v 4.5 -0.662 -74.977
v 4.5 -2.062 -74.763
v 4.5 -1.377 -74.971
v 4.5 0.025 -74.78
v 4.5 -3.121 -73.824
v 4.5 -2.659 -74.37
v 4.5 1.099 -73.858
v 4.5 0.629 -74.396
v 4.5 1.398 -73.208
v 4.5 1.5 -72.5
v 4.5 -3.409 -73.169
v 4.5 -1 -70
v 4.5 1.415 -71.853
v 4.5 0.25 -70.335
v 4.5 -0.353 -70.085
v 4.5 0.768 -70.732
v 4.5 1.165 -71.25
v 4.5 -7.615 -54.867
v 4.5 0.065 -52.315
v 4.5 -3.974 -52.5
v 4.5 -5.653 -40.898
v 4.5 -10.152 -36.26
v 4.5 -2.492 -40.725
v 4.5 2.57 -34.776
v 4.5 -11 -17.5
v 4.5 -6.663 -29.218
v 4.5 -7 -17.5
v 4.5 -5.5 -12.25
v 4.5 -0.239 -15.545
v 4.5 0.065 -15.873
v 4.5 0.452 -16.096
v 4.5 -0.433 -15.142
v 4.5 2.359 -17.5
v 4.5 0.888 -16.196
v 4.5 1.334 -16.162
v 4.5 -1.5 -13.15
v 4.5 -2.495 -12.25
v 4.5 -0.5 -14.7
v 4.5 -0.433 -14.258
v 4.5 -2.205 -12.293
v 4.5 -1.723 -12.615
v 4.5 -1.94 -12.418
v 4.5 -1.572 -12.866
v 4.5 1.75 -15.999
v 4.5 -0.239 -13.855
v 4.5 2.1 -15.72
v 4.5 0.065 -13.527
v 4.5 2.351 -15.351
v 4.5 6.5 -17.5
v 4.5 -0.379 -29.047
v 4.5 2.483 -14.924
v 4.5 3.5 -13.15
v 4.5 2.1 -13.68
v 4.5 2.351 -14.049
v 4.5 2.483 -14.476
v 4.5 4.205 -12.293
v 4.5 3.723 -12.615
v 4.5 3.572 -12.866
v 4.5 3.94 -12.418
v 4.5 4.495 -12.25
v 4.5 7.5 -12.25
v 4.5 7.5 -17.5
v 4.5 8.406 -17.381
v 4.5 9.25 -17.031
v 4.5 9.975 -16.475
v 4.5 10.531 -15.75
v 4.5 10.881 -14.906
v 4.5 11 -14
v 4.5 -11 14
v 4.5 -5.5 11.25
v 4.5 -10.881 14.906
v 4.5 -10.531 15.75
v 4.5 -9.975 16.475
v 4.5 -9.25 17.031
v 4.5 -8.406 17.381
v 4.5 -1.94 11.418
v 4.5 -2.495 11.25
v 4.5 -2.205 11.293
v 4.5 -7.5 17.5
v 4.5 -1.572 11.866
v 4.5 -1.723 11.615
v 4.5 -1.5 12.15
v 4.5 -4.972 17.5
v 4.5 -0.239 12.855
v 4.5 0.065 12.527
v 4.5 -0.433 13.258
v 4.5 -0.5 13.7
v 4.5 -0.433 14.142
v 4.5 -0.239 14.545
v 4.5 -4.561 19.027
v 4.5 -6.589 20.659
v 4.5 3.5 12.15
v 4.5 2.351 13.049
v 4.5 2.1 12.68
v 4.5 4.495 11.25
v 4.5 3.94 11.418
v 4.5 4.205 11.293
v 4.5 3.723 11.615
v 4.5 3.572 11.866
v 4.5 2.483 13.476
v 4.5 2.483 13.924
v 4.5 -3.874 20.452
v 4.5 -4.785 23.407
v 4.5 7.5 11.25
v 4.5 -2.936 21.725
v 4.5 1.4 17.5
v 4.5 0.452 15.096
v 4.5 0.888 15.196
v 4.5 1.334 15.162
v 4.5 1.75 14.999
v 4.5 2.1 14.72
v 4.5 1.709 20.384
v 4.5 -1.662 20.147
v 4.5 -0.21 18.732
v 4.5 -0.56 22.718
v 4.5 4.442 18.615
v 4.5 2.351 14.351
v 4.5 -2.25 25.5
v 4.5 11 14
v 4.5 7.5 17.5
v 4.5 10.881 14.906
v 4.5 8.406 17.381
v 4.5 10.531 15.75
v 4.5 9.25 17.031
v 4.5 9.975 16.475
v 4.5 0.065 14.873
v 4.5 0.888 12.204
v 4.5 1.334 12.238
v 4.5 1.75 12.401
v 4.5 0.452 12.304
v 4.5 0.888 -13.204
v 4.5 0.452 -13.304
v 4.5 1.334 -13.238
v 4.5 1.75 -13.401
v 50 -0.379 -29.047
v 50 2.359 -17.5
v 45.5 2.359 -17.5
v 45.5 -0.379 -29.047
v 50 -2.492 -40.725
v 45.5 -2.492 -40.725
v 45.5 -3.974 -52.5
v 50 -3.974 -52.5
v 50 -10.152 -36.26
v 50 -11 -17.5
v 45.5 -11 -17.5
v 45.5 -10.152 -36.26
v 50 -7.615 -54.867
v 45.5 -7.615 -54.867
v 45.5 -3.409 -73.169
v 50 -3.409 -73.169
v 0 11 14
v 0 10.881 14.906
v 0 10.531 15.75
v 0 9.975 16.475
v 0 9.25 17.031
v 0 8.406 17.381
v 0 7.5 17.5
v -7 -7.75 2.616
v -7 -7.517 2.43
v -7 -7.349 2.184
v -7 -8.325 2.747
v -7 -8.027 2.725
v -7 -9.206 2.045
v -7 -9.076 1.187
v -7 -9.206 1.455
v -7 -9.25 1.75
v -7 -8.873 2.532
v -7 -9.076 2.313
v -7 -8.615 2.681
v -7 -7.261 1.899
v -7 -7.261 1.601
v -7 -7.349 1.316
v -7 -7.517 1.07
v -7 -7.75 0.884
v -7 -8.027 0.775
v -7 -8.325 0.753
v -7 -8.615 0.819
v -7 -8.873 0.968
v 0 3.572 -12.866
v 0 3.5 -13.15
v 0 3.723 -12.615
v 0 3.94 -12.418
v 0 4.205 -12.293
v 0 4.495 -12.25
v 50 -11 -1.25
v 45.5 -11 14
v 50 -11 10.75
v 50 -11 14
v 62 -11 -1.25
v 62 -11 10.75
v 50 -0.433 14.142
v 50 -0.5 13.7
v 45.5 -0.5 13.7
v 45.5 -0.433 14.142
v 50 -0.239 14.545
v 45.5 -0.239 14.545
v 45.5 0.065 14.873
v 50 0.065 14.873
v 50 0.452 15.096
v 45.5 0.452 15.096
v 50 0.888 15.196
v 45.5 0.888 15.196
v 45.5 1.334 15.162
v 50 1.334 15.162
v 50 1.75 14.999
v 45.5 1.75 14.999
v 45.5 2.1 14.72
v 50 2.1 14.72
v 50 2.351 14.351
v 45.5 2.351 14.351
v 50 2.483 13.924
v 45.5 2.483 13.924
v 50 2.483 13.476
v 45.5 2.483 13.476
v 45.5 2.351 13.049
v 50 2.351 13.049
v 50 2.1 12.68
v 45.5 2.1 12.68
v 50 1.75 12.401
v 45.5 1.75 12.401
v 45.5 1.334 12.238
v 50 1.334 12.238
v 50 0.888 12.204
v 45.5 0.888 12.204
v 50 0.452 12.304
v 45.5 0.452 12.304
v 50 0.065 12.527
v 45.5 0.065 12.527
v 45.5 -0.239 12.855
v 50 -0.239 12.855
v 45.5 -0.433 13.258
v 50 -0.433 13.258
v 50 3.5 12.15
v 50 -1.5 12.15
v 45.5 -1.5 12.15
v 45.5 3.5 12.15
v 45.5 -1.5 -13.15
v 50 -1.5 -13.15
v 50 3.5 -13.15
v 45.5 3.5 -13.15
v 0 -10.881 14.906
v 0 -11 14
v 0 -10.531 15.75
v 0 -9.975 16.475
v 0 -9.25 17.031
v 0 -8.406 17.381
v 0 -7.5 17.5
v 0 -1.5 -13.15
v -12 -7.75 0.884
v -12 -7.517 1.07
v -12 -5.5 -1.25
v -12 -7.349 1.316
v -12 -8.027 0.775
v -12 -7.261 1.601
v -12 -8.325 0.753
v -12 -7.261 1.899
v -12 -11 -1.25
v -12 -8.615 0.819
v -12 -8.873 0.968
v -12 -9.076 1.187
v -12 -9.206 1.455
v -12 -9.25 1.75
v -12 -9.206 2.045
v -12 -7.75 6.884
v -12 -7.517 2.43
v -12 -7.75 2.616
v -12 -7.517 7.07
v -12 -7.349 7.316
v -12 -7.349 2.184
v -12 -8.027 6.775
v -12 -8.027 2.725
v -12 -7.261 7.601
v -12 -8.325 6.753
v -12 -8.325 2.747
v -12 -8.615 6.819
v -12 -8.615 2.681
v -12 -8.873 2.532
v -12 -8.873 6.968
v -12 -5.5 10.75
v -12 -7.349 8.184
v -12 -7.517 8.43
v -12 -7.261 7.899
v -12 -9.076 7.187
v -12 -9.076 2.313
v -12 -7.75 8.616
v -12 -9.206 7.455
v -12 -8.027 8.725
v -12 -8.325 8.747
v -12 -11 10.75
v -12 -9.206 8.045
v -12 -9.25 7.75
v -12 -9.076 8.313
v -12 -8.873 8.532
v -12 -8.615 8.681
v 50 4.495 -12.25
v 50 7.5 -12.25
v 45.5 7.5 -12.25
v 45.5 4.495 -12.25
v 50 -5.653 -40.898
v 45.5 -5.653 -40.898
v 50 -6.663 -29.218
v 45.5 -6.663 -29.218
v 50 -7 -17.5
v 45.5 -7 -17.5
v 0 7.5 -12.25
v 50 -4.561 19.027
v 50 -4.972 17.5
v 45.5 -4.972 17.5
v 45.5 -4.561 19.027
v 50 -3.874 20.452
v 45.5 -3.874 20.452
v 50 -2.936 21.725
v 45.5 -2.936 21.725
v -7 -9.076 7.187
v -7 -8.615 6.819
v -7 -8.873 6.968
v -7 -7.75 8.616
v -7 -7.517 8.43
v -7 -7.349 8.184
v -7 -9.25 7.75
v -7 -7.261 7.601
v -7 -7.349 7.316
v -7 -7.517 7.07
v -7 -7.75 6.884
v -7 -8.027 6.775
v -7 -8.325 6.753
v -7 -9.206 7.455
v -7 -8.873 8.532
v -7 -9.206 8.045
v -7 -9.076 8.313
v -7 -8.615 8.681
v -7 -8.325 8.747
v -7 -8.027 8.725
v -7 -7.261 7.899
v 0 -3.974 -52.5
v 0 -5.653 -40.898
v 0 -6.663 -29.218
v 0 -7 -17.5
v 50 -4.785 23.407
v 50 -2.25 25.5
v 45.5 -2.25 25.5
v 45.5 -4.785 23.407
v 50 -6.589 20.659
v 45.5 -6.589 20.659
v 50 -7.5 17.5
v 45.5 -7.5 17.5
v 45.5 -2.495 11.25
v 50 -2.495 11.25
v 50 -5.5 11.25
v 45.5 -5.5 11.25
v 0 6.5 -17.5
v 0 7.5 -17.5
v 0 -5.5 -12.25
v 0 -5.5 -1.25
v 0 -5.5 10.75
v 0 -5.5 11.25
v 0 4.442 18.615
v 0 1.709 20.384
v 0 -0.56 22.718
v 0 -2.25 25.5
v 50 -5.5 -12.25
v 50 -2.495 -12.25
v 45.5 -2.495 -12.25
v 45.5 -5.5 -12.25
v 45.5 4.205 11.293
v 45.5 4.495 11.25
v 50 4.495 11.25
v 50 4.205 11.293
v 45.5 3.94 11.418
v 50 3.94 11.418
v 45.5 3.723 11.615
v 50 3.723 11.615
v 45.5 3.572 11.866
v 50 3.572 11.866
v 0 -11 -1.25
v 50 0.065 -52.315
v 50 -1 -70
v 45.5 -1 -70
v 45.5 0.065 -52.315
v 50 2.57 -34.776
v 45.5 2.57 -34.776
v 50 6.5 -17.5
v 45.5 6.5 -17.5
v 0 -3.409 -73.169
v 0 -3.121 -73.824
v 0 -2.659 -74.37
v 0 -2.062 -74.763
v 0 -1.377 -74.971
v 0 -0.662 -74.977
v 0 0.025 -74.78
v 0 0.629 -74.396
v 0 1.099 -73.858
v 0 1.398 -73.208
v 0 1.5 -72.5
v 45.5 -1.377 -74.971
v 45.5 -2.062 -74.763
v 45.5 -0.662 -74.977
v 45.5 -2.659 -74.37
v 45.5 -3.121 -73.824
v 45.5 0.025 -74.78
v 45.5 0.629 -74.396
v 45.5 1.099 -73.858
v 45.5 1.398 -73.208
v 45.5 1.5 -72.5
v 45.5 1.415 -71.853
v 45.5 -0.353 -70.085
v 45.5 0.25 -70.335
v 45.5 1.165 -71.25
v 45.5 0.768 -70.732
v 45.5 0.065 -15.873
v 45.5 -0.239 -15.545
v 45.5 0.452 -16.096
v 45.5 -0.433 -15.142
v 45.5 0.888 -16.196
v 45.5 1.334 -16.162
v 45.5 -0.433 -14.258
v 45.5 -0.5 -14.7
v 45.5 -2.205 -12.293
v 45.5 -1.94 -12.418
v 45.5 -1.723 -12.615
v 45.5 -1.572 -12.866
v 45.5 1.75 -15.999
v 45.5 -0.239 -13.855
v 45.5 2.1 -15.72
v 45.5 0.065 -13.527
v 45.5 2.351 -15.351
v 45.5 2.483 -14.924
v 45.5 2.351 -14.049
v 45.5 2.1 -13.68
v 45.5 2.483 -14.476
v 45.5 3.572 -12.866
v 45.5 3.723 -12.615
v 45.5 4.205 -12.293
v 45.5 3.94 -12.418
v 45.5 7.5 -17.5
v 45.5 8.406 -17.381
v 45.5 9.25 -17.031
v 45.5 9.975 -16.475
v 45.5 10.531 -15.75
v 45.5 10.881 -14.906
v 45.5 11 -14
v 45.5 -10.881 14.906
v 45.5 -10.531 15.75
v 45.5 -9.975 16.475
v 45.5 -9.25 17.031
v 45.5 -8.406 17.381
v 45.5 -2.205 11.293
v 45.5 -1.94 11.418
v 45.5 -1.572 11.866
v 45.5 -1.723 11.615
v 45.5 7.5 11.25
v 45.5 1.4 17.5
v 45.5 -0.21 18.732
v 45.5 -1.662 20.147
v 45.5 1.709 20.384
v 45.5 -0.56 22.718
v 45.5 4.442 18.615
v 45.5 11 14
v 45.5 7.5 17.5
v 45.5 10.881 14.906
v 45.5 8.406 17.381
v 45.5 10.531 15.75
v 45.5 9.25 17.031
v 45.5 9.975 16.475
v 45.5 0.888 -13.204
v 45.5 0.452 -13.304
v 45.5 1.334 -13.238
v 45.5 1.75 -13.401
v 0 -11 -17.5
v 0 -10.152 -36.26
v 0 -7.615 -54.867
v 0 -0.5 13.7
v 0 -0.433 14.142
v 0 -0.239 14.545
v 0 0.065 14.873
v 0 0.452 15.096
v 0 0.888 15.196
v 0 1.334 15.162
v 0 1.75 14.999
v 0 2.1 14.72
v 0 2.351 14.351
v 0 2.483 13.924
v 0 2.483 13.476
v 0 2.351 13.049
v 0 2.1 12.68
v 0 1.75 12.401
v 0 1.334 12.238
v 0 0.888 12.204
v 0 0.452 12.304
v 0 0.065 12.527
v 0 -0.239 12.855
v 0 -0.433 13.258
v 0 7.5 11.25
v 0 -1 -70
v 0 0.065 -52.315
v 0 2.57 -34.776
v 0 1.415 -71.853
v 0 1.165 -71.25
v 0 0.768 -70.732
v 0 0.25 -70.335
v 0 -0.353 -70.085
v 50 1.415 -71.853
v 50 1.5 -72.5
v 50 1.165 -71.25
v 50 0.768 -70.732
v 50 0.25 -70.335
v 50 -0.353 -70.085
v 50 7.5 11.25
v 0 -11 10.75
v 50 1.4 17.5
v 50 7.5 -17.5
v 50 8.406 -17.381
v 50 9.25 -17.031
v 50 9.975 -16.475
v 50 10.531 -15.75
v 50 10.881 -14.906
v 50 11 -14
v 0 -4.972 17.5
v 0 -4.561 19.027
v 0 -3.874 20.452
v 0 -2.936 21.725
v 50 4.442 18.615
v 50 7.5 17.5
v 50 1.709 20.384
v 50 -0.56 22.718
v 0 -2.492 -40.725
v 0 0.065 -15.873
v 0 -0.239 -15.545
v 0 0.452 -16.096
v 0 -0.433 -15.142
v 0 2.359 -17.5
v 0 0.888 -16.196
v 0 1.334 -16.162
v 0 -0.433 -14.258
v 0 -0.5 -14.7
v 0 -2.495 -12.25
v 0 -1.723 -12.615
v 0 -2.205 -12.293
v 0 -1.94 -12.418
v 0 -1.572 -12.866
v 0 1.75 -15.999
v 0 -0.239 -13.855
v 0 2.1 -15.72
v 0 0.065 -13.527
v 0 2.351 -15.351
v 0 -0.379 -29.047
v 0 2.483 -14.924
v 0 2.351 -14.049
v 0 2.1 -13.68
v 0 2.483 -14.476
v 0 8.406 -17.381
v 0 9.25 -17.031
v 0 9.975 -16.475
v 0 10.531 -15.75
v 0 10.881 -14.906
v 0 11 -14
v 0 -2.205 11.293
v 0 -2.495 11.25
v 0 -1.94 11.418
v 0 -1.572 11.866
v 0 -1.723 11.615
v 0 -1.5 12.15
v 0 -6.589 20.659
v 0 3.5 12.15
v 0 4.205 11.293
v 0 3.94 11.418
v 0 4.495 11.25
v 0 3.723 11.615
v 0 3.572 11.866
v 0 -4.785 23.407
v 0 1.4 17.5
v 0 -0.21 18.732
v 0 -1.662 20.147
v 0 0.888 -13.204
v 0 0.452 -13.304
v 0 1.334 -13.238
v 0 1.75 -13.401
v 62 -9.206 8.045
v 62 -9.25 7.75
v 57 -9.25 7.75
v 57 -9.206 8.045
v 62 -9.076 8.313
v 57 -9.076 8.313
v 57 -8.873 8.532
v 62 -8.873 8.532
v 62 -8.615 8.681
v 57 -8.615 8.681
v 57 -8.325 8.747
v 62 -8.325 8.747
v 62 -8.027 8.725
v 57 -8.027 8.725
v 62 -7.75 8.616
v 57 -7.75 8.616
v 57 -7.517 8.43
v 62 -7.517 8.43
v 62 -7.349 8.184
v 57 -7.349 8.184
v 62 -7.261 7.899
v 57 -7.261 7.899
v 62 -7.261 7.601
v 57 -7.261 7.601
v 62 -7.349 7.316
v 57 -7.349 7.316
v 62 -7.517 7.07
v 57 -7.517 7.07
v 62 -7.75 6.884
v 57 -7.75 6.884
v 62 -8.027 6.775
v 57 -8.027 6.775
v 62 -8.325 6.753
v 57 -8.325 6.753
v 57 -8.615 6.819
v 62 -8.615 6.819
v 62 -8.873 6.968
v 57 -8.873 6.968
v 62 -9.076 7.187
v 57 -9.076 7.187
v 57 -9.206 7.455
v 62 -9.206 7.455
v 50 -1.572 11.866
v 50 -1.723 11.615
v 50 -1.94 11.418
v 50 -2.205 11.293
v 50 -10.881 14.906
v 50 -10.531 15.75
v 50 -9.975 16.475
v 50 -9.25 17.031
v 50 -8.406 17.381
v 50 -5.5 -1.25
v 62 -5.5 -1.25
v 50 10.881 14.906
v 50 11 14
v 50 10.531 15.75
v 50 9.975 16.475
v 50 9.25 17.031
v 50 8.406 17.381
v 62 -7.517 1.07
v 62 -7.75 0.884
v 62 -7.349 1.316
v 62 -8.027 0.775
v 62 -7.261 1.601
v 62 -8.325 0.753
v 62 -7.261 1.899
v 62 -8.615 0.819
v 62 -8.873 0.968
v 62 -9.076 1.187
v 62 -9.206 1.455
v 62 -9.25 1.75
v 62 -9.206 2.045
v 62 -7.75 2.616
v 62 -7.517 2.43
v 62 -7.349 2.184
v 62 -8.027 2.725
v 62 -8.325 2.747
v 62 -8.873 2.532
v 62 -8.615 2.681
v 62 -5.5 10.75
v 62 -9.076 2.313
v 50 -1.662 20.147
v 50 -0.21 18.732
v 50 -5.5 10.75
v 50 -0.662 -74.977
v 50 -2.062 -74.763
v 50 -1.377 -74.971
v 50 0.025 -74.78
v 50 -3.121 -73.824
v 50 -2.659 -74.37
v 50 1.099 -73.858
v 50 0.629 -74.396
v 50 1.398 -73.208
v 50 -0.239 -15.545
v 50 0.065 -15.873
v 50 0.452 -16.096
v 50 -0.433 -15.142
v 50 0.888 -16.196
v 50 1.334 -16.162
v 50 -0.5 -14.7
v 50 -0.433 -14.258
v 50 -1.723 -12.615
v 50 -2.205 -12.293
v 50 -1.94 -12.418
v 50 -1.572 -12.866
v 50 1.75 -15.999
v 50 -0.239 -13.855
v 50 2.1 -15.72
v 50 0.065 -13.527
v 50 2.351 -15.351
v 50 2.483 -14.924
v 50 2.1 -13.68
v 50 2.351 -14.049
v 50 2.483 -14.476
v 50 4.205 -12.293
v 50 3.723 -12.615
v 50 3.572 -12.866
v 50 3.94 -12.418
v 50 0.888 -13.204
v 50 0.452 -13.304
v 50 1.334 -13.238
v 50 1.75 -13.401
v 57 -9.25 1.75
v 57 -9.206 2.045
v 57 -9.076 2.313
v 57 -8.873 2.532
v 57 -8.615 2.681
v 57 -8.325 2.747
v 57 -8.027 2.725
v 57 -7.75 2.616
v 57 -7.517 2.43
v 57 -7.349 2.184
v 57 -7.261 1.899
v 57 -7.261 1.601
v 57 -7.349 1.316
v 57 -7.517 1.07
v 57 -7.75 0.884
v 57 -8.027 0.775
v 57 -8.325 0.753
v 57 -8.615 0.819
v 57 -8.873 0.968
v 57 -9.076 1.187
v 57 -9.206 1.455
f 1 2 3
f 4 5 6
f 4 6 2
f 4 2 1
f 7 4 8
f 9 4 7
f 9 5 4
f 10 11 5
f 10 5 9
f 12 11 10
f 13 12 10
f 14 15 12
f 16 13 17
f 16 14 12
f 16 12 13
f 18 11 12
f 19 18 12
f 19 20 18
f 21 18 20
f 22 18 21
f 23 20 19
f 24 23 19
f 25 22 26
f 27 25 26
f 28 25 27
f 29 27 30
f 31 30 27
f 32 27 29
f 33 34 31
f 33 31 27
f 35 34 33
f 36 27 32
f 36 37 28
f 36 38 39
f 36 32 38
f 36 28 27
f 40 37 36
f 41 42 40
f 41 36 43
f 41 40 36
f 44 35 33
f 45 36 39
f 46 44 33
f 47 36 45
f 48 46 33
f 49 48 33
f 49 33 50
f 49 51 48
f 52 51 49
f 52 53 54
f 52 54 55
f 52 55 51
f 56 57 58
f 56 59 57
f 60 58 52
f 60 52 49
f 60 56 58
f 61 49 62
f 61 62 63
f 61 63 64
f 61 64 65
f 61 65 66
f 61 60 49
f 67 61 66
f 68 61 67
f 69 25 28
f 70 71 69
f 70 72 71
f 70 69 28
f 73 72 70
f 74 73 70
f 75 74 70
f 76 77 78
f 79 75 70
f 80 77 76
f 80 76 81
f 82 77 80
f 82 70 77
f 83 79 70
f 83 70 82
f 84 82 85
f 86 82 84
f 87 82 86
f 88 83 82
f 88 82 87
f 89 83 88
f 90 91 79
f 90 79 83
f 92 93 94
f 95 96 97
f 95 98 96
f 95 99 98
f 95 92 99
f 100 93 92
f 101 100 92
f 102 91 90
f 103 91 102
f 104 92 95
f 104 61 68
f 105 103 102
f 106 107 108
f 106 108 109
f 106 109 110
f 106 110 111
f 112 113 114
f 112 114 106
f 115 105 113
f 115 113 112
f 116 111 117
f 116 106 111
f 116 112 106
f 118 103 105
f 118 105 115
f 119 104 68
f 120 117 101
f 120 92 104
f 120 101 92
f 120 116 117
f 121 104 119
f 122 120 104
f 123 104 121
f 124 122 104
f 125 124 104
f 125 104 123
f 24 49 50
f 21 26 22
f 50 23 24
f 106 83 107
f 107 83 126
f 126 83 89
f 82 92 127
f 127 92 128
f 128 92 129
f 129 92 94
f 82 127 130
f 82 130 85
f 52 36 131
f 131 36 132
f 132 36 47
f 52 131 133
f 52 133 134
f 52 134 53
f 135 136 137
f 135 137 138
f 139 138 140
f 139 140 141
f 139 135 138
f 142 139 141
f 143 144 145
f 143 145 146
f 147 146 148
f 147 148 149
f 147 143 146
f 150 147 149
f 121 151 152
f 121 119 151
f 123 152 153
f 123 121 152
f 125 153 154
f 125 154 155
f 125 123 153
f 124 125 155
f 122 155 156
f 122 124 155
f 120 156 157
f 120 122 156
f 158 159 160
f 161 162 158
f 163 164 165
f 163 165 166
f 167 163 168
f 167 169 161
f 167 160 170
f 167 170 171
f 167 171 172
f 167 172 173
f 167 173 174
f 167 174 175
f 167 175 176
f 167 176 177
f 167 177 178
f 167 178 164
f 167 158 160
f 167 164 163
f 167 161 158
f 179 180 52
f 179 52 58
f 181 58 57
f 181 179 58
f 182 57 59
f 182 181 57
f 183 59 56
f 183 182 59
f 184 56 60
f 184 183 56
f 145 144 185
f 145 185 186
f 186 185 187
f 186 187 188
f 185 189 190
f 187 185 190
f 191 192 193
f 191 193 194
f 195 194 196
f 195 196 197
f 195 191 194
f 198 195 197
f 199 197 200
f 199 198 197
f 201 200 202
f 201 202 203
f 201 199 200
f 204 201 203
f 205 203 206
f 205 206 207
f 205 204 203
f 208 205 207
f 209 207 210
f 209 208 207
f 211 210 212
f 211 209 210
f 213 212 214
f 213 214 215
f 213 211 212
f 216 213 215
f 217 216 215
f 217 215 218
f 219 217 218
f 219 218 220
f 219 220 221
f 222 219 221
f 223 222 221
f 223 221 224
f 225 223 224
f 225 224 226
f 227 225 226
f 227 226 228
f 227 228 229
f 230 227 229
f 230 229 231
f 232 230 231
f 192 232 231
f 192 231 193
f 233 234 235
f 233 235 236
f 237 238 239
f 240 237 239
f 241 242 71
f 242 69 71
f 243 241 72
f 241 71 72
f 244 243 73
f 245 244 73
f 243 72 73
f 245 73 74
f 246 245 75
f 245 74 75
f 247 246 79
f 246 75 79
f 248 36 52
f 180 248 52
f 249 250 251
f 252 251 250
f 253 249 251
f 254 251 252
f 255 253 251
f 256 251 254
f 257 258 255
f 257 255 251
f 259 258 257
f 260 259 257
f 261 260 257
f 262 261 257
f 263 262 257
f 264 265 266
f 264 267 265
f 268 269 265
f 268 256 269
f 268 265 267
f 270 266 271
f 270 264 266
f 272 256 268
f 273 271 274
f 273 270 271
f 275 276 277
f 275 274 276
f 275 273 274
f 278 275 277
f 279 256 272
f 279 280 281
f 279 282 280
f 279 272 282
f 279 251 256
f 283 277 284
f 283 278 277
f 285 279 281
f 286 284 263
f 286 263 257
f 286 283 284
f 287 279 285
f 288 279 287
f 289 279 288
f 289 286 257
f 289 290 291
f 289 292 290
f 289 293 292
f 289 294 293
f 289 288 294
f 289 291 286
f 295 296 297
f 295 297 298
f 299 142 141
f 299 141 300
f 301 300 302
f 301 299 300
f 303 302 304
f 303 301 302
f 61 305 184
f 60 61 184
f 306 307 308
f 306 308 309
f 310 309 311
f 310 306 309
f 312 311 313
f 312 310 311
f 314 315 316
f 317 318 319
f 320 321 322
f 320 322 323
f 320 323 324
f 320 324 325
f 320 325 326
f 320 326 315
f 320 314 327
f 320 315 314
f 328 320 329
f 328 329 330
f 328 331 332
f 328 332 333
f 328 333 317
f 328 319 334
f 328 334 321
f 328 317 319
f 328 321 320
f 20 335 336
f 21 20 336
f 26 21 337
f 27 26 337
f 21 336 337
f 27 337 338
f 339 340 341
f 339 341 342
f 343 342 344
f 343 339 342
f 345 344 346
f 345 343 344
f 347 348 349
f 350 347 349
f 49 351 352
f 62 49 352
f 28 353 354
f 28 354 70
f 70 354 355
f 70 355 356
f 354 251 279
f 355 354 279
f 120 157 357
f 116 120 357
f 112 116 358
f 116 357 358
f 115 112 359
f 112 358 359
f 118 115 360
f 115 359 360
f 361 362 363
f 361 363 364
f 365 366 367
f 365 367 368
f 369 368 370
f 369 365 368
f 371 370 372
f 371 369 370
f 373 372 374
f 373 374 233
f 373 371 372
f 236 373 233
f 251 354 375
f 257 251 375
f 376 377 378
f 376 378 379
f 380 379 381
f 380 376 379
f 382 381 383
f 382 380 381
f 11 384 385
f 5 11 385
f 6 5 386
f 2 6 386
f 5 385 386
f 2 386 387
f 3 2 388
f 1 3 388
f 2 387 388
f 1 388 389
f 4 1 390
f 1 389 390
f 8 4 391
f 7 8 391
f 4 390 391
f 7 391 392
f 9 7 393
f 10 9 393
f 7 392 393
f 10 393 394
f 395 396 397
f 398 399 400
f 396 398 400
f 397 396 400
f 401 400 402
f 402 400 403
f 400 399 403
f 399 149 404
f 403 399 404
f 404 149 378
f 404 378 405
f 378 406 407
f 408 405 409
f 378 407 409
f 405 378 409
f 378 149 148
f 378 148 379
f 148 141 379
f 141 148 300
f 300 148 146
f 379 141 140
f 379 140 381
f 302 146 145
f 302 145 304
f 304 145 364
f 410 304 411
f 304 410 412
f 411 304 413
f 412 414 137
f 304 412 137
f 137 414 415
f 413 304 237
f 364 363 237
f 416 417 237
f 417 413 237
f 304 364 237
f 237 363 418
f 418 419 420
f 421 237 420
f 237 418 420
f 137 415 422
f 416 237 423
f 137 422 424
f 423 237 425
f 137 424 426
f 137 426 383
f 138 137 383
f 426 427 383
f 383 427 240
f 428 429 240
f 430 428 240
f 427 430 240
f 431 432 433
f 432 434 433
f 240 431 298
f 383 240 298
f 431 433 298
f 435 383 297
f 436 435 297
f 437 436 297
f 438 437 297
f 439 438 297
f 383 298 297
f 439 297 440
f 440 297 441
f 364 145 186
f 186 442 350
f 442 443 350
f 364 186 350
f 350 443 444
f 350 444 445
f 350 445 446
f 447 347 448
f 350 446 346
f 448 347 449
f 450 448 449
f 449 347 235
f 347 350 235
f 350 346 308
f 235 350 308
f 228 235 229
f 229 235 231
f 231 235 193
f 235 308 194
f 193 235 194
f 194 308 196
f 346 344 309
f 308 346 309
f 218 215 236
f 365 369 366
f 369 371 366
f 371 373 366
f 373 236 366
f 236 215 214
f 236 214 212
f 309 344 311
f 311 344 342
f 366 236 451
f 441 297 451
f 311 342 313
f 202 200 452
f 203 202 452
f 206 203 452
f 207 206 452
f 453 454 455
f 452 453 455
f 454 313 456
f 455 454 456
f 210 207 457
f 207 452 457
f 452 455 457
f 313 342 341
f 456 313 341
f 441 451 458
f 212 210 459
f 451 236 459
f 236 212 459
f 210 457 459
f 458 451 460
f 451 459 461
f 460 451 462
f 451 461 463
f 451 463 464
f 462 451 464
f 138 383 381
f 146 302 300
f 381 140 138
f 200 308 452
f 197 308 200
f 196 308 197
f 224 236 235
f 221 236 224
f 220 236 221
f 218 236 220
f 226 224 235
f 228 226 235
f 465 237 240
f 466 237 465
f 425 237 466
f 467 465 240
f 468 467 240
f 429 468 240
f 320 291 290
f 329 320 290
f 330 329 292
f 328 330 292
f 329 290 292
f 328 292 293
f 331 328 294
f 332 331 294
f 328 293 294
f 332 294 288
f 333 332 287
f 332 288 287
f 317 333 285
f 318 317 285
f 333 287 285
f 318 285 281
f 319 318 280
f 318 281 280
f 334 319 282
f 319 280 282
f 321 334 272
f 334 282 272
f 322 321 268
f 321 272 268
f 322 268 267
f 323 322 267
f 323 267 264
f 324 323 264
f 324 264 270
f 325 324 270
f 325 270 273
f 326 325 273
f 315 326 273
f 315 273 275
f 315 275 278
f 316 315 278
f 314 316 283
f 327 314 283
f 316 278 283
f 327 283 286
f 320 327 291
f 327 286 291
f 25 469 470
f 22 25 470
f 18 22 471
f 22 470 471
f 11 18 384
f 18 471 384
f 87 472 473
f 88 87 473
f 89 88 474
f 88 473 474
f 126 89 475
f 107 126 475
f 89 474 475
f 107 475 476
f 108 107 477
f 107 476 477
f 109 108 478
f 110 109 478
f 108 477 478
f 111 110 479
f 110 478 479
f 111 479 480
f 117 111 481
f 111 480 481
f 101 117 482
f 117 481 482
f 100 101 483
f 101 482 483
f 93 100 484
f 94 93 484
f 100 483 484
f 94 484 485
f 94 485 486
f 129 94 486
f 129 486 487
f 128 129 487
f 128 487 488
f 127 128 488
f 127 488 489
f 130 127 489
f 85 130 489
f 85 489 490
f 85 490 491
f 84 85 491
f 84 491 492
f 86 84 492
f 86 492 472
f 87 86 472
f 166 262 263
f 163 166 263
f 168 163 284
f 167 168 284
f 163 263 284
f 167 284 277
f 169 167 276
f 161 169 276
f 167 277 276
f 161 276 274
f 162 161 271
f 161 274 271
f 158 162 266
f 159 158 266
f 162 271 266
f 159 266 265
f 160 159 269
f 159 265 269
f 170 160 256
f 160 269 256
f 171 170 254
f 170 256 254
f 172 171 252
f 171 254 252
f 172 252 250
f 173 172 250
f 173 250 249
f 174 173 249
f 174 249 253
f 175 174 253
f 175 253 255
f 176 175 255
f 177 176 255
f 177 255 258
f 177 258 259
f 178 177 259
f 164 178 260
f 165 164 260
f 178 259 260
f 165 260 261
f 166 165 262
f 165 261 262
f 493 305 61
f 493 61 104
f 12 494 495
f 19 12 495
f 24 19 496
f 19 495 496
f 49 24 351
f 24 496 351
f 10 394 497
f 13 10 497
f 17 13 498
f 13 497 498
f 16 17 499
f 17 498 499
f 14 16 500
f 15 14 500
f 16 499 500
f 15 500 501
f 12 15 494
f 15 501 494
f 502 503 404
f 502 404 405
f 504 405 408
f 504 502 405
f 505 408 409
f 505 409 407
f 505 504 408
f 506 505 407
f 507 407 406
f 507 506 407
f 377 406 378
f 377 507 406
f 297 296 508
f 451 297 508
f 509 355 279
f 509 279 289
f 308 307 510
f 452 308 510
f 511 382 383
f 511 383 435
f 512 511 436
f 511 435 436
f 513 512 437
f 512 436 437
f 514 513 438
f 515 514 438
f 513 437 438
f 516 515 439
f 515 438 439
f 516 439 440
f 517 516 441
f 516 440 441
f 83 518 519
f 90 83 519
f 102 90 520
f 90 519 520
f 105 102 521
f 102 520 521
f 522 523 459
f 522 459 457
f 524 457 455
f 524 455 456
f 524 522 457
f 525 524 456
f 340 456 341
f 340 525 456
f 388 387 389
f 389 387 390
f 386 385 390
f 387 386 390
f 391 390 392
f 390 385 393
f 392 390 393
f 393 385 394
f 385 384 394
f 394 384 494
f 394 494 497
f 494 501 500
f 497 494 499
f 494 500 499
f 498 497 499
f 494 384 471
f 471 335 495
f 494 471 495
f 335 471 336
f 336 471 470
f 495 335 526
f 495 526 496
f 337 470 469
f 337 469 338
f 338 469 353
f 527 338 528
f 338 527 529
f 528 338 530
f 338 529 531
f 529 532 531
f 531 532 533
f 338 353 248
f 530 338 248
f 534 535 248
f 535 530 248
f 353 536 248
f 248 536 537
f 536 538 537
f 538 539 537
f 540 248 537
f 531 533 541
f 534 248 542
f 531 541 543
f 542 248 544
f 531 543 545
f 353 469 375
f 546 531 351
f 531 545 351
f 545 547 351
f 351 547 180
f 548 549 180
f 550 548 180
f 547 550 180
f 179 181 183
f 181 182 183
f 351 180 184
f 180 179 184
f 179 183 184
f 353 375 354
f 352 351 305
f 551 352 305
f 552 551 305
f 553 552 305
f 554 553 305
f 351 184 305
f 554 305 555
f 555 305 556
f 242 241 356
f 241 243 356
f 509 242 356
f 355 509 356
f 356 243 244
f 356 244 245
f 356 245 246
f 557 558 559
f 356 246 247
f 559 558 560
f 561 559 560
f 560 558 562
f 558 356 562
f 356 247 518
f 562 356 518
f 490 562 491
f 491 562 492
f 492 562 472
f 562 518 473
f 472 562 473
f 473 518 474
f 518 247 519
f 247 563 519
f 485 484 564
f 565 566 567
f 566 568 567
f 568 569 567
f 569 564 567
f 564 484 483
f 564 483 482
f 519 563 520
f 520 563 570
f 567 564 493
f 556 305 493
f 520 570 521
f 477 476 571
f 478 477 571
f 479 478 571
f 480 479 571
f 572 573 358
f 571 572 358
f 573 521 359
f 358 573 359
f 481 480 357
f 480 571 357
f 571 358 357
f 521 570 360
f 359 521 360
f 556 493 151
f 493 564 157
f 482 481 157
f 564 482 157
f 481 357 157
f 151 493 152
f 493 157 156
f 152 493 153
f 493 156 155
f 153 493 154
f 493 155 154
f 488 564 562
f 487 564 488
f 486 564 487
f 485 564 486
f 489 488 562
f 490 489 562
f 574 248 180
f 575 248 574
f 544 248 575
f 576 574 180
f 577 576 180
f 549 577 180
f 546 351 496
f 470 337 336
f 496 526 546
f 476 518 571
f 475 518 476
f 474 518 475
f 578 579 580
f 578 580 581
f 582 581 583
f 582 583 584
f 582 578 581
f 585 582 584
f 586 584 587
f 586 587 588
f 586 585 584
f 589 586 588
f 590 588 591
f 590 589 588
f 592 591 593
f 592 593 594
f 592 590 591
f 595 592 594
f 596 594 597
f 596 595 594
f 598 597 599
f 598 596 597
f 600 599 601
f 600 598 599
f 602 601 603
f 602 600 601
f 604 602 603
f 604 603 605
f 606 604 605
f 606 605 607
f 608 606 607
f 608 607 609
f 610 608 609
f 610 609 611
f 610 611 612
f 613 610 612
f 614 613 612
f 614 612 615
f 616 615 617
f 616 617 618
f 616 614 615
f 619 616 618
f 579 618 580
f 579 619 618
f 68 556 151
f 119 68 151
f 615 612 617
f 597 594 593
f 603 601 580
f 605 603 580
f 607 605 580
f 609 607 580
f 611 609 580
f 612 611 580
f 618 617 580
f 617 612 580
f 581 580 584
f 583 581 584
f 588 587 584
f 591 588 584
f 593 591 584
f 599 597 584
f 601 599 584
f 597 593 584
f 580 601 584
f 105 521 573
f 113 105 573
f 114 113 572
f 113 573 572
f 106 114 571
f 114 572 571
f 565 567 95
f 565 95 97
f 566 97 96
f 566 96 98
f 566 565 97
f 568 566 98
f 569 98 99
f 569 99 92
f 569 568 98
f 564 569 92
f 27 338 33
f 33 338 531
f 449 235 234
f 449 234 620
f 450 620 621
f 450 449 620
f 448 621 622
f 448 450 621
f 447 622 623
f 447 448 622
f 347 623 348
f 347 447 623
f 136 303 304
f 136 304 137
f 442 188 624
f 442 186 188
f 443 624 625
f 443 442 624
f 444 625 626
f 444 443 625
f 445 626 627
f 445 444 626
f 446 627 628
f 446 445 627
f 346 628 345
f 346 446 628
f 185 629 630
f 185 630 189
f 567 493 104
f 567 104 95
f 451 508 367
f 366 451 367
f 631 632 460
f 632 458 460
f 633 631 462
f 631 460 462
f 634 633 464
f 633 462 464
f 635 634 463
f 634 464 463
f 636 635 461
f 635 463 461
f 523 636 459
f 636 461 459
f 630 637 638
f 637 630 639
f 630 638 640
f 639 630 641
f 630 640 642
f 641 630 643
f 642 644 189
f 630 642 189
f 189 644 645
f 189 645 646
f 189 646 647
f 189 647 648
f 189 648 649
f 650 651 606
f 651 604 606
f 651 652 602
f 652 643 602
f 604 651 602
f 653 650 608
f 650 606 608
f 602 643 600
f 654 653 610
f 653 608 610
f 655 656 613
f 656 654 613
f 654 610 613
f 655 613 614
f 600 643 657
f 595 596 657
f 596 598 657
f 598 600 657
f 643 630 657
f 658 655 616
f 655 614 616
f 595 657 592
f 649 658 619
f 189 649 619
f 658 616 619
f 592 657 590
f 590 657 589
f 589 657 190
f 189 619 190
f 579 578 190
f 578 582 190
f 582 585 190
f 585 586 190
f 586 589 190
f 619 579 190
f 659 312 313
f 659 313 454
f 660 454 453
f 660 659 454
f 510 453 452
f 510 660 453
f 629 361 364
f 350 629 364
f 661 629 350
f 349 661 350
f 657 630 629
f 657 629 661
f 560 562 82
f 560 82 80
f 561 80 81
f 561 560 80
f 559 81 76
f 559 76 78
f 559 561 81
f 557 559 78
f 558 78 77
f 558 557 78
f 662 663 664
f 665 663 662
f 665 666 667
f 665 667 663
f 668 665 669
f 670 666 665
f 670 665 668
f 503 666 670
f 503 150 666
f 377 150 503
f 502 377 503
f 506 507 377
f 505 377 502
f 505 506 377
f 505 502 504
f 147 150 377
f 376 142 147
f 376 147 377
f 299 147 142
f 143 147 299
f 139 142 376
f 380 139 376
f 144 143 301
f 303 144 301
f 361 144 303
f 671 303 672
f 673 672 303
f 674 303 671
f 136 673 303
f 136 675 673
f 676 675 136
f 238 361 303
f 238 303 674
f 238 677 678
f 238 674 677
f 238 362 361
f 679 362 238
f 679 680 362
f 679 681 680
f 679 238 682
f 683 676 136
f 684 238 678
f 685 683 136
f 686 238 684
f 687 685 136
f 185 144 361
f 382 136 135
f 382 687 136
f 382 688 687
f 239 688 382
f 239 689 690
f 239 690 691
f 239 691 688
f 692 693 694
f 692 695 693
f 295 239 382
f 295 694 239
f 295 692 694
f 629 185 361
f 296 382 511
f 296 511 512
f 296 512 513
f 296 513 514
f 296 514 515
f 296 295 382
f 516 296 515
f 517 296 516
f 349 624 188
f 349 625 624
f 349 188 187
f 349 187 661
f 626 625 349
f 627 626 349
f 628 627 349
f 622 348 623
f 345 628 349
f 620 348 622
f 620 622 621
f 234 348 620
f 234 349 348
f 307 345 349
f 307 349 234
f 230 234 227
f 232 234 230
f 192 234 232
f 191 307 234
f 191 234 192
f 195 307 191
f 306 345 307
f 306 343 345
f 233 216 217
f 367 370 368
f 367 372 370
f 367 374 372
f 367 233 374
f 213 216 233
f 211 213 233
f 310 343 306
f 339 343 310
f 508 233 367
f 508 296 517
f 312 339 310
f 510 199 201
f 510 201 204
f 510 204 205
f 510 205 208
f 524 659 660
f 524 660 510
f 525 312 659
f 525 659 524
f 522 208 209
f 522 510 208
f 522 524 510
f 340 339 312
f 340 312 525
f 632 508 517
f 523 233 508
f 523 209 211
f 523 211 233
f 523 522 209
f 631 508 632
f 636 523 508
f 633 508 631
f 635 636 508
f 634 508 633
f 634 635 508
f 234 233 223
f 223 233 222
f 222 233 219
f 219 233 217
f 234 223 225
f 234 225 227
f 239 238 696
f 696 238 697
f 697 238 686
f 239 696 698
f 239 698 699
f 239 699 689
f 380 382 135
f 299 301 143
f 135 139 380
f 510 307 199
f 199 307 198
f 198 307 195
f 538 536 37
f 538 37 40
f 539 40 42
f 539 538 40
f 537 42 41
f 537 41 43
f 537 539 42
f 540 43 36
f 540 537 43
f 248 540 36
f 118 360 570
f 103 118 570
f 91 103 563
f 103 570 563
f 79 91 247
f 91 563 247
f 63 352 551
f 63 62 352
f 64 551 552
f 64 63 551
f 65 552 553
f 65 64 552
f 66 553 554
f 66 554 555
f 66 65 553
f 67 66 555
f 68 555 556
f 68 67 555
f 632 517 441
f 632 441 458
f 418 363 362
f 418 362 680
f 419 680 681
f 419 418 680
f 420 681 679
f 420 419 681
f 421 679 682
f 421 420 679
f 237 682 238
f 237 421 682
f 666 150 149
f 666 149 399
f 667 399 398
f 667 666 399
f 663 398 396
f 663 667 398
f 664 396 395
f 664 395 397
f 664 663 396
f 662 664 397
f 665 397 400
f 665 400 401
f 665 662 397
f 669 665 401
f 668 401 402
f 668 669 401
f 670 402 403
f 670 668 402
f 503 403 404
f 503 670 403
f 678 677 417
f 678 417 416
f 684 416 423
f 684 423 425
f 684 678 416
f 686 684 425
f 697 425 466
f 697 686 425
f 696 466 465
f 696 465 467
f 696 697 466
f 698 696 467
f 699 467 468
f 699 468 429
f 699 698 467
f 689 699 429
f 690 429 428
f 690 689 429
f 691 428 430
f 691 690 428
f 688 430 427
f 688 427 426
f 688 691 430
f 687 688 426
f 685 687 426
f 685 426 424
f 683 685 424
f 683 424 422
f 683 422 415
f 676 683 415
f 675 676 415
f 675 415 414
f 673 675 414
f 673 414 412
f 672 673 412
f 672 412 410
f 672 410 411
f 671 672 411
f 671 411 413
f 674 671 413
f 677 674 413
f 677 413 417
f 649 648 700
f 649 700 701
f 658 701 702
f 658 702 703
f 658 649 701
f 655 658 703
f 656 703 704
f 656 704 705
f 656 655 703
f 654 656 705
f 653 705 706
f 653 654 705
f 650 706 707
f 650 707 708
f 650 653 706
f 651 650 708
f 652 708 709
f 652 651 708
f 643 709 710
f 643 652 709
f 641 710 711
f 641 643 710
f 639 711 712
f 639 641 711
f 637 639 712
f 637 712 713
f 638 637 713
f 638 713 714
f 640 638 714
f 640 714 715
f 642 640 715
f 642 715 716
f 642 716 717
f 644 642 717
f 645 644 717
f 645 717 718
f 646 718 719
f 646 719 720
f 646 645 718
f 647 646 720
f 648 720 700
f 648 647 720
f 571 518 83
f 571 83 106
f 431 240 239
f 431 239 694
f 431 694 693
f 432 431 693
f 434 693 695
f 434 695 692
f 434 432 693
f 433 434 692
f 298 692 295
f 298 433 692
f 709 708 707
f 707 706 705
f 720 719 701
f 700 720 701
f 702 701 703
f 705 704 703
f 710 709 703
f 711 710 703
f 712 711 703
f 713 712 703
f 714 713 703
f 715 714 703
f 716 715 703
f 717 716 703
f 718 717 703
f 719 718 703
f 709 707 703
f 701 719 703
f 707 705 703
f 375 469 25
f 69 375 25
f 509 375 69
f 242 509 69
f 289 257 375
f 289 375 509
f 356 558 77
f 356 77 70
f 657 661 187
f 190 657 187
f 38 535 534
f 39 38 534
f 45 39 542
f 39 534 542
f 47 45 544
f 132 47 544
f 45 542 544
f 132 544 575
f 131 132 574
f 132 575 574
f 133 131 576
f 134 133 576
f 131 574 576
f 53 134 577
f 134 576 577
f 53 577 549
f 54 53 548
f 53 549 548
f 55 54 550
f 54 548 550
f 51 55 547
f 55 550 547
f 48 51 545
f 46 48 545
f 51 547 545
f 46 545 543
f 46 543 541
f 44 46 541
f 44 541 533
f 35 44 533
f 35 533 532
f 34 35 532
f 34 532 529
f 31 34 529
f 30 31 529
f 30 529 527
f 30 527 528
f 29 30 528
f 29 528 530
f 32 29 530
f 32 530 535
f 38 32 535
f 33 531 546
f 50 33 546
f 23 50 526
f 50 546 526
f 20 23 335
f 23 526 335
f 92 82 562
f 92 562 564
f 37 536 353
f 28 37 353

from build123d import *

# Parameters (mm, degrees)
F0_W           = 22
F0_H           = 35
F1_DEPTH       = 4.5
F3_DEPTH       = 4.5
F4_R           = 3.5
F6_DEPTH       = 4.5
F7_W           = 5.5
F7_H           = 12
F8_DEPTH       = 12
F9_W           = 13
F9_H           = 23.5
F10_DEPTH      = 25
F11_R          = 1.5
F12_DEPTH      = 25
F13_R          = 1
F14_DEPTH      = 5
F17_W          = 5
F17_H          = 0.9
F18_DEPTH      = 60
F19_T1_DEPTH   = 9.4749371855
F19_2_T1_DEPTH = 9.4749371855


# Not quite as in the source:
# - a fillet or chamfer that OpenCascade refuses, or shapes differently, is made with other operations: its cross-section is extruded or revolved along the edge and cut away or added


with BuildPart() as f1:
    # F0 (on Right) → F1 (new body)
    with BuildSketch(Plane.YZ):
        Rectangle(F0_W, F0_H)
    extrude(amount=F1_DEPTH)

    # F2 (on Right) → F3 (join, through all)
    with BuildSketch(Plane.YZ):
        with BuildLine():
            ThreePointArc((-3.4087221095, -73.1693711968), (-2.9904054853, -70.9872918312), (-1, -70))
            ThreePointArc((-1, -70), (1.1380813831, -43.5197259119), (6.5, -17.5))
            Line((6.5, -17.5), (2.3585708498, -17.5))
            ThreePointArc((2.3585708498, -17.5), (-1.5137994024, -34.8722383779), (-3.9738680642, -52.5))
            ThreePointArc((-3.9738680642, -52.5), (-6.2420584126, -35.065288743), (-7, -17.5))
            Line((-7, -17.5), (-11, -17.5))
            ThreePointArc((-11, -17.5), (-9.0934391059, -45.5922871508), (-3.4087221095, -73.1693711968))
        make_face()
        with BuildLine():
            ThreePointArc((-3.4087221095, -73.1693711968), (-0.6622169882, -74.9770754201), (1.5, -72.5))
            ThreePointArc((1.5, -72.5), (0.767766953, -70.732233047), (-1, -70))
            ThreePointArc((-1, -70), (-2.9904054853, -70.9872918312), (-3.4087221095, -73.1693711968))
        make_face()
    extrude(amount=F3_DEPTH)

    # F4
    f4_edges = [f1.edges().sort_by_distance(p)[0] for p in [
        (2.25, -11, 17.5),
        (2.25, 11, 17.5),
        (2.25, 11, -17.5),
    ]]
    fillet(f4_edges, radius=F4_R)

    # F5 (on Right) → F6 (join, through all)
    with BuildSketch(Plane.YZ):
        with BuildLine():
            Line((1.4, 17.5), (7.5, 17.5))
            ThreePointArc((7.5, 17.5), (1.7091044965, 20.3837523551), (-2.25, 25.5))
            ThreePointArc((-2.25, 25.5), (-5.7904576912, 22.1007691099), (-7.5, 17.5))
            Line((-7.5, 17.5), (-4.9720180544, 17.5))
            ThreePointArc((-4.9720180544, 17.5), (-4.2510603876, 19.7558550861), (-2.9356909086, 21.7252370349))
            ThreePointArc((-2.9356909086, 21.7252370349), (-0.9575351482, 19.4179700576), (1.4, 17.5))
        make_face()
    extrude(amount=F6_DEPTH)

    # F7 (on face) → F8 (join)
    with BuildSketch(Plane(origin=(0, 0, 0), x_dir=(0, -1, 0), z_dir=(-1, 0, 0))):
        with Locations((8.25, 4.75)):
            Rectangle(F7_W, F7_H)
    extrude(amount=F8_DEPTH)

    # F9 (on face) → F10 (cut)
    with BuildSketch(Plane(origin=(0, 0, 0), x_dir=(0, -1, 0), z_dir=(-1, 0, 0))):
        with Locations((-1, -0.5)):
            Rectangle(F9_W, F9_H)
    extrude(amount=-F10_DEPTH, mode=Mode.SUBTRACT)

    # F11 (on face) → F12 (cut)
    with BuildSketch(Plane(origin=(0, 0, 0), x_dir=(0, -1, 0), z_dir=(-1, 0, 0))):
        with Locations((-1, 13.7)):
            Circle(F11_R)
        with Locations((-1, -14.7)):
            Circle(F11_R)
    extrude(amount=-F12_DEPTH, mode=Mode.SUBTRACT)

    # F13 (on face) → F14 (cut)
    with BuildSketch(Plane(origin=(-12, 0, 0), x_dir=(0, -1, 0), z_dir=(-1, 0, 0))):
        with Locations((8.25, 7.75)):
            Circle(F13_R)
        with Locations((8.25, 1.75)):
            Circle(F13_R)
    extrude(amount=-F14_DEPTH, mode=Mode.SUBTRACT)


with BuildPart() as f16_1:
    # F16: instance of F1
    add(f1.part.mirror(Plane.YZ.offset(25)))


with BuildPart() as f18_tool:
    # F17 (on face) → F18 (new body)
    with BuildSketch(Plane.YZ.offset(50)):
        with Locations((1, 11.7)):
            Rectangle(F17_W, F17_H)
        with Locations((1, -12.7)):
            Rectangle(F17_W, F17_H)
    extrude(amount=-F18_DEPTH)


with BuildPart() as f1_1:
    add(f1.part)

    # F18: cut by f18_tool
    add(f18_tool.part, mode=Mode.SUBTRACT)

    # F19: fillet of radius 1 on 4 edges, made by hand

    # F19_s2 → F19_t1 (cut)
    with BuildSketch(Plane.YZ.offset(-2.4874685928)):
        with BuildLine():
            ThreePointArc((-1.5, 12.15), (-1.8241670439, 11.5083801513), (-2.4949874371, 11.25))
            Line((-2.4949874371, 11.25), (-1.5, 11.25))
            Line((-1.5, 11.25), (-1.5, 12.15))
        make_face()
        with BuildLine():
            ThreePointArc((4.4949874371, 11.25), (3.8241670439, 11.5083801513), (3.5, 12.15))
            Line((3.5, 12.15), (3.5, 11.25))
            Line((3.5, 11.25), (4.4949874371, 11.25))
        make_face()
        with BuildLine():
            ThreePointArc((3.5, -13.15), (3.8241670439, -12.5083801513), (4.4949874371, -12.25))
            Line((4.4949874371, -12.25), (3.5, -12.25))
            Line((3.5, -12.25), (3.5, -13.15))
        make_face()
        with BuildLine():
            ThreePointArc((-2.4949874371, -12.25), (-1.8241670439, -12.5083801513), (-1.5, -13.15))
            Line((-1.5, -13.15), (-1.5, -12.25))
            Line((-1.5, -12.25), (-2.4949874371, -12.25))
        make_face()
    extrude(amount=F19_T1_DEPTH, mode=Mode.SUBTRACT)


with BuildPart() as f16_1_1:
    add(f16_1.part)

    # F18: cut by f18_tool
    add(f18_tool.part, mode=Mode.SUBTRACT)

    # F19#2: fillet of radius 1 on 4 edges, made by hand

    # F19_2_s2 → F19_2_t1 (cut)
    with BuildSketch(Plane.YZ.offset(43.0125314072)):
        with BuildLine():
            ThreePointArc((-1.5, 12.15), (-1.8241670439, 11.5083801513), (-2.4949874371, 11.25))
            Line((-2.4949874371, 11.25), (-1.5, 11.25))
            Line((-1.5, 11.25), (-1.5, 12.15))
        make_face()
        with BuildLine():
            ThreePointArc((4.4949874371, 11.25), (3.8241670439, 11.5083801513), (3.5, 12.15))
            Line((3.5, 12.15), (3.5, 11.25))
            Line((3.5, 11.25), (4.4949874371, 11.25))
        make_face()
        with BuildLine():
            ThreePointArc((-2.4949874371, -12.25), (-1.8241670439, -12.5083801513), (-1.5, -13.15))
            Line((-1.5, -13.15), (-1.5, -12.25))
            Line((-1.5, -12.25), (-2.4949874371, -12.25))
        make_face()
        with BuildLine():
            ThreePointArc((3.5, -13.15), (3.8241670439, -12.5083801513), (4.4949874371, -12.25))
            Line((4.4949874371, -12.25), (3.5, -12.25))
            Line((3.5, -12.25), (3.5, -13.15))
        make_face()
    extrude(amount=F19_2_T1_DEPTH, mode=Mode.SUBTRACT)


solid = Compound([f1_1.part, f16_1_1.part])
